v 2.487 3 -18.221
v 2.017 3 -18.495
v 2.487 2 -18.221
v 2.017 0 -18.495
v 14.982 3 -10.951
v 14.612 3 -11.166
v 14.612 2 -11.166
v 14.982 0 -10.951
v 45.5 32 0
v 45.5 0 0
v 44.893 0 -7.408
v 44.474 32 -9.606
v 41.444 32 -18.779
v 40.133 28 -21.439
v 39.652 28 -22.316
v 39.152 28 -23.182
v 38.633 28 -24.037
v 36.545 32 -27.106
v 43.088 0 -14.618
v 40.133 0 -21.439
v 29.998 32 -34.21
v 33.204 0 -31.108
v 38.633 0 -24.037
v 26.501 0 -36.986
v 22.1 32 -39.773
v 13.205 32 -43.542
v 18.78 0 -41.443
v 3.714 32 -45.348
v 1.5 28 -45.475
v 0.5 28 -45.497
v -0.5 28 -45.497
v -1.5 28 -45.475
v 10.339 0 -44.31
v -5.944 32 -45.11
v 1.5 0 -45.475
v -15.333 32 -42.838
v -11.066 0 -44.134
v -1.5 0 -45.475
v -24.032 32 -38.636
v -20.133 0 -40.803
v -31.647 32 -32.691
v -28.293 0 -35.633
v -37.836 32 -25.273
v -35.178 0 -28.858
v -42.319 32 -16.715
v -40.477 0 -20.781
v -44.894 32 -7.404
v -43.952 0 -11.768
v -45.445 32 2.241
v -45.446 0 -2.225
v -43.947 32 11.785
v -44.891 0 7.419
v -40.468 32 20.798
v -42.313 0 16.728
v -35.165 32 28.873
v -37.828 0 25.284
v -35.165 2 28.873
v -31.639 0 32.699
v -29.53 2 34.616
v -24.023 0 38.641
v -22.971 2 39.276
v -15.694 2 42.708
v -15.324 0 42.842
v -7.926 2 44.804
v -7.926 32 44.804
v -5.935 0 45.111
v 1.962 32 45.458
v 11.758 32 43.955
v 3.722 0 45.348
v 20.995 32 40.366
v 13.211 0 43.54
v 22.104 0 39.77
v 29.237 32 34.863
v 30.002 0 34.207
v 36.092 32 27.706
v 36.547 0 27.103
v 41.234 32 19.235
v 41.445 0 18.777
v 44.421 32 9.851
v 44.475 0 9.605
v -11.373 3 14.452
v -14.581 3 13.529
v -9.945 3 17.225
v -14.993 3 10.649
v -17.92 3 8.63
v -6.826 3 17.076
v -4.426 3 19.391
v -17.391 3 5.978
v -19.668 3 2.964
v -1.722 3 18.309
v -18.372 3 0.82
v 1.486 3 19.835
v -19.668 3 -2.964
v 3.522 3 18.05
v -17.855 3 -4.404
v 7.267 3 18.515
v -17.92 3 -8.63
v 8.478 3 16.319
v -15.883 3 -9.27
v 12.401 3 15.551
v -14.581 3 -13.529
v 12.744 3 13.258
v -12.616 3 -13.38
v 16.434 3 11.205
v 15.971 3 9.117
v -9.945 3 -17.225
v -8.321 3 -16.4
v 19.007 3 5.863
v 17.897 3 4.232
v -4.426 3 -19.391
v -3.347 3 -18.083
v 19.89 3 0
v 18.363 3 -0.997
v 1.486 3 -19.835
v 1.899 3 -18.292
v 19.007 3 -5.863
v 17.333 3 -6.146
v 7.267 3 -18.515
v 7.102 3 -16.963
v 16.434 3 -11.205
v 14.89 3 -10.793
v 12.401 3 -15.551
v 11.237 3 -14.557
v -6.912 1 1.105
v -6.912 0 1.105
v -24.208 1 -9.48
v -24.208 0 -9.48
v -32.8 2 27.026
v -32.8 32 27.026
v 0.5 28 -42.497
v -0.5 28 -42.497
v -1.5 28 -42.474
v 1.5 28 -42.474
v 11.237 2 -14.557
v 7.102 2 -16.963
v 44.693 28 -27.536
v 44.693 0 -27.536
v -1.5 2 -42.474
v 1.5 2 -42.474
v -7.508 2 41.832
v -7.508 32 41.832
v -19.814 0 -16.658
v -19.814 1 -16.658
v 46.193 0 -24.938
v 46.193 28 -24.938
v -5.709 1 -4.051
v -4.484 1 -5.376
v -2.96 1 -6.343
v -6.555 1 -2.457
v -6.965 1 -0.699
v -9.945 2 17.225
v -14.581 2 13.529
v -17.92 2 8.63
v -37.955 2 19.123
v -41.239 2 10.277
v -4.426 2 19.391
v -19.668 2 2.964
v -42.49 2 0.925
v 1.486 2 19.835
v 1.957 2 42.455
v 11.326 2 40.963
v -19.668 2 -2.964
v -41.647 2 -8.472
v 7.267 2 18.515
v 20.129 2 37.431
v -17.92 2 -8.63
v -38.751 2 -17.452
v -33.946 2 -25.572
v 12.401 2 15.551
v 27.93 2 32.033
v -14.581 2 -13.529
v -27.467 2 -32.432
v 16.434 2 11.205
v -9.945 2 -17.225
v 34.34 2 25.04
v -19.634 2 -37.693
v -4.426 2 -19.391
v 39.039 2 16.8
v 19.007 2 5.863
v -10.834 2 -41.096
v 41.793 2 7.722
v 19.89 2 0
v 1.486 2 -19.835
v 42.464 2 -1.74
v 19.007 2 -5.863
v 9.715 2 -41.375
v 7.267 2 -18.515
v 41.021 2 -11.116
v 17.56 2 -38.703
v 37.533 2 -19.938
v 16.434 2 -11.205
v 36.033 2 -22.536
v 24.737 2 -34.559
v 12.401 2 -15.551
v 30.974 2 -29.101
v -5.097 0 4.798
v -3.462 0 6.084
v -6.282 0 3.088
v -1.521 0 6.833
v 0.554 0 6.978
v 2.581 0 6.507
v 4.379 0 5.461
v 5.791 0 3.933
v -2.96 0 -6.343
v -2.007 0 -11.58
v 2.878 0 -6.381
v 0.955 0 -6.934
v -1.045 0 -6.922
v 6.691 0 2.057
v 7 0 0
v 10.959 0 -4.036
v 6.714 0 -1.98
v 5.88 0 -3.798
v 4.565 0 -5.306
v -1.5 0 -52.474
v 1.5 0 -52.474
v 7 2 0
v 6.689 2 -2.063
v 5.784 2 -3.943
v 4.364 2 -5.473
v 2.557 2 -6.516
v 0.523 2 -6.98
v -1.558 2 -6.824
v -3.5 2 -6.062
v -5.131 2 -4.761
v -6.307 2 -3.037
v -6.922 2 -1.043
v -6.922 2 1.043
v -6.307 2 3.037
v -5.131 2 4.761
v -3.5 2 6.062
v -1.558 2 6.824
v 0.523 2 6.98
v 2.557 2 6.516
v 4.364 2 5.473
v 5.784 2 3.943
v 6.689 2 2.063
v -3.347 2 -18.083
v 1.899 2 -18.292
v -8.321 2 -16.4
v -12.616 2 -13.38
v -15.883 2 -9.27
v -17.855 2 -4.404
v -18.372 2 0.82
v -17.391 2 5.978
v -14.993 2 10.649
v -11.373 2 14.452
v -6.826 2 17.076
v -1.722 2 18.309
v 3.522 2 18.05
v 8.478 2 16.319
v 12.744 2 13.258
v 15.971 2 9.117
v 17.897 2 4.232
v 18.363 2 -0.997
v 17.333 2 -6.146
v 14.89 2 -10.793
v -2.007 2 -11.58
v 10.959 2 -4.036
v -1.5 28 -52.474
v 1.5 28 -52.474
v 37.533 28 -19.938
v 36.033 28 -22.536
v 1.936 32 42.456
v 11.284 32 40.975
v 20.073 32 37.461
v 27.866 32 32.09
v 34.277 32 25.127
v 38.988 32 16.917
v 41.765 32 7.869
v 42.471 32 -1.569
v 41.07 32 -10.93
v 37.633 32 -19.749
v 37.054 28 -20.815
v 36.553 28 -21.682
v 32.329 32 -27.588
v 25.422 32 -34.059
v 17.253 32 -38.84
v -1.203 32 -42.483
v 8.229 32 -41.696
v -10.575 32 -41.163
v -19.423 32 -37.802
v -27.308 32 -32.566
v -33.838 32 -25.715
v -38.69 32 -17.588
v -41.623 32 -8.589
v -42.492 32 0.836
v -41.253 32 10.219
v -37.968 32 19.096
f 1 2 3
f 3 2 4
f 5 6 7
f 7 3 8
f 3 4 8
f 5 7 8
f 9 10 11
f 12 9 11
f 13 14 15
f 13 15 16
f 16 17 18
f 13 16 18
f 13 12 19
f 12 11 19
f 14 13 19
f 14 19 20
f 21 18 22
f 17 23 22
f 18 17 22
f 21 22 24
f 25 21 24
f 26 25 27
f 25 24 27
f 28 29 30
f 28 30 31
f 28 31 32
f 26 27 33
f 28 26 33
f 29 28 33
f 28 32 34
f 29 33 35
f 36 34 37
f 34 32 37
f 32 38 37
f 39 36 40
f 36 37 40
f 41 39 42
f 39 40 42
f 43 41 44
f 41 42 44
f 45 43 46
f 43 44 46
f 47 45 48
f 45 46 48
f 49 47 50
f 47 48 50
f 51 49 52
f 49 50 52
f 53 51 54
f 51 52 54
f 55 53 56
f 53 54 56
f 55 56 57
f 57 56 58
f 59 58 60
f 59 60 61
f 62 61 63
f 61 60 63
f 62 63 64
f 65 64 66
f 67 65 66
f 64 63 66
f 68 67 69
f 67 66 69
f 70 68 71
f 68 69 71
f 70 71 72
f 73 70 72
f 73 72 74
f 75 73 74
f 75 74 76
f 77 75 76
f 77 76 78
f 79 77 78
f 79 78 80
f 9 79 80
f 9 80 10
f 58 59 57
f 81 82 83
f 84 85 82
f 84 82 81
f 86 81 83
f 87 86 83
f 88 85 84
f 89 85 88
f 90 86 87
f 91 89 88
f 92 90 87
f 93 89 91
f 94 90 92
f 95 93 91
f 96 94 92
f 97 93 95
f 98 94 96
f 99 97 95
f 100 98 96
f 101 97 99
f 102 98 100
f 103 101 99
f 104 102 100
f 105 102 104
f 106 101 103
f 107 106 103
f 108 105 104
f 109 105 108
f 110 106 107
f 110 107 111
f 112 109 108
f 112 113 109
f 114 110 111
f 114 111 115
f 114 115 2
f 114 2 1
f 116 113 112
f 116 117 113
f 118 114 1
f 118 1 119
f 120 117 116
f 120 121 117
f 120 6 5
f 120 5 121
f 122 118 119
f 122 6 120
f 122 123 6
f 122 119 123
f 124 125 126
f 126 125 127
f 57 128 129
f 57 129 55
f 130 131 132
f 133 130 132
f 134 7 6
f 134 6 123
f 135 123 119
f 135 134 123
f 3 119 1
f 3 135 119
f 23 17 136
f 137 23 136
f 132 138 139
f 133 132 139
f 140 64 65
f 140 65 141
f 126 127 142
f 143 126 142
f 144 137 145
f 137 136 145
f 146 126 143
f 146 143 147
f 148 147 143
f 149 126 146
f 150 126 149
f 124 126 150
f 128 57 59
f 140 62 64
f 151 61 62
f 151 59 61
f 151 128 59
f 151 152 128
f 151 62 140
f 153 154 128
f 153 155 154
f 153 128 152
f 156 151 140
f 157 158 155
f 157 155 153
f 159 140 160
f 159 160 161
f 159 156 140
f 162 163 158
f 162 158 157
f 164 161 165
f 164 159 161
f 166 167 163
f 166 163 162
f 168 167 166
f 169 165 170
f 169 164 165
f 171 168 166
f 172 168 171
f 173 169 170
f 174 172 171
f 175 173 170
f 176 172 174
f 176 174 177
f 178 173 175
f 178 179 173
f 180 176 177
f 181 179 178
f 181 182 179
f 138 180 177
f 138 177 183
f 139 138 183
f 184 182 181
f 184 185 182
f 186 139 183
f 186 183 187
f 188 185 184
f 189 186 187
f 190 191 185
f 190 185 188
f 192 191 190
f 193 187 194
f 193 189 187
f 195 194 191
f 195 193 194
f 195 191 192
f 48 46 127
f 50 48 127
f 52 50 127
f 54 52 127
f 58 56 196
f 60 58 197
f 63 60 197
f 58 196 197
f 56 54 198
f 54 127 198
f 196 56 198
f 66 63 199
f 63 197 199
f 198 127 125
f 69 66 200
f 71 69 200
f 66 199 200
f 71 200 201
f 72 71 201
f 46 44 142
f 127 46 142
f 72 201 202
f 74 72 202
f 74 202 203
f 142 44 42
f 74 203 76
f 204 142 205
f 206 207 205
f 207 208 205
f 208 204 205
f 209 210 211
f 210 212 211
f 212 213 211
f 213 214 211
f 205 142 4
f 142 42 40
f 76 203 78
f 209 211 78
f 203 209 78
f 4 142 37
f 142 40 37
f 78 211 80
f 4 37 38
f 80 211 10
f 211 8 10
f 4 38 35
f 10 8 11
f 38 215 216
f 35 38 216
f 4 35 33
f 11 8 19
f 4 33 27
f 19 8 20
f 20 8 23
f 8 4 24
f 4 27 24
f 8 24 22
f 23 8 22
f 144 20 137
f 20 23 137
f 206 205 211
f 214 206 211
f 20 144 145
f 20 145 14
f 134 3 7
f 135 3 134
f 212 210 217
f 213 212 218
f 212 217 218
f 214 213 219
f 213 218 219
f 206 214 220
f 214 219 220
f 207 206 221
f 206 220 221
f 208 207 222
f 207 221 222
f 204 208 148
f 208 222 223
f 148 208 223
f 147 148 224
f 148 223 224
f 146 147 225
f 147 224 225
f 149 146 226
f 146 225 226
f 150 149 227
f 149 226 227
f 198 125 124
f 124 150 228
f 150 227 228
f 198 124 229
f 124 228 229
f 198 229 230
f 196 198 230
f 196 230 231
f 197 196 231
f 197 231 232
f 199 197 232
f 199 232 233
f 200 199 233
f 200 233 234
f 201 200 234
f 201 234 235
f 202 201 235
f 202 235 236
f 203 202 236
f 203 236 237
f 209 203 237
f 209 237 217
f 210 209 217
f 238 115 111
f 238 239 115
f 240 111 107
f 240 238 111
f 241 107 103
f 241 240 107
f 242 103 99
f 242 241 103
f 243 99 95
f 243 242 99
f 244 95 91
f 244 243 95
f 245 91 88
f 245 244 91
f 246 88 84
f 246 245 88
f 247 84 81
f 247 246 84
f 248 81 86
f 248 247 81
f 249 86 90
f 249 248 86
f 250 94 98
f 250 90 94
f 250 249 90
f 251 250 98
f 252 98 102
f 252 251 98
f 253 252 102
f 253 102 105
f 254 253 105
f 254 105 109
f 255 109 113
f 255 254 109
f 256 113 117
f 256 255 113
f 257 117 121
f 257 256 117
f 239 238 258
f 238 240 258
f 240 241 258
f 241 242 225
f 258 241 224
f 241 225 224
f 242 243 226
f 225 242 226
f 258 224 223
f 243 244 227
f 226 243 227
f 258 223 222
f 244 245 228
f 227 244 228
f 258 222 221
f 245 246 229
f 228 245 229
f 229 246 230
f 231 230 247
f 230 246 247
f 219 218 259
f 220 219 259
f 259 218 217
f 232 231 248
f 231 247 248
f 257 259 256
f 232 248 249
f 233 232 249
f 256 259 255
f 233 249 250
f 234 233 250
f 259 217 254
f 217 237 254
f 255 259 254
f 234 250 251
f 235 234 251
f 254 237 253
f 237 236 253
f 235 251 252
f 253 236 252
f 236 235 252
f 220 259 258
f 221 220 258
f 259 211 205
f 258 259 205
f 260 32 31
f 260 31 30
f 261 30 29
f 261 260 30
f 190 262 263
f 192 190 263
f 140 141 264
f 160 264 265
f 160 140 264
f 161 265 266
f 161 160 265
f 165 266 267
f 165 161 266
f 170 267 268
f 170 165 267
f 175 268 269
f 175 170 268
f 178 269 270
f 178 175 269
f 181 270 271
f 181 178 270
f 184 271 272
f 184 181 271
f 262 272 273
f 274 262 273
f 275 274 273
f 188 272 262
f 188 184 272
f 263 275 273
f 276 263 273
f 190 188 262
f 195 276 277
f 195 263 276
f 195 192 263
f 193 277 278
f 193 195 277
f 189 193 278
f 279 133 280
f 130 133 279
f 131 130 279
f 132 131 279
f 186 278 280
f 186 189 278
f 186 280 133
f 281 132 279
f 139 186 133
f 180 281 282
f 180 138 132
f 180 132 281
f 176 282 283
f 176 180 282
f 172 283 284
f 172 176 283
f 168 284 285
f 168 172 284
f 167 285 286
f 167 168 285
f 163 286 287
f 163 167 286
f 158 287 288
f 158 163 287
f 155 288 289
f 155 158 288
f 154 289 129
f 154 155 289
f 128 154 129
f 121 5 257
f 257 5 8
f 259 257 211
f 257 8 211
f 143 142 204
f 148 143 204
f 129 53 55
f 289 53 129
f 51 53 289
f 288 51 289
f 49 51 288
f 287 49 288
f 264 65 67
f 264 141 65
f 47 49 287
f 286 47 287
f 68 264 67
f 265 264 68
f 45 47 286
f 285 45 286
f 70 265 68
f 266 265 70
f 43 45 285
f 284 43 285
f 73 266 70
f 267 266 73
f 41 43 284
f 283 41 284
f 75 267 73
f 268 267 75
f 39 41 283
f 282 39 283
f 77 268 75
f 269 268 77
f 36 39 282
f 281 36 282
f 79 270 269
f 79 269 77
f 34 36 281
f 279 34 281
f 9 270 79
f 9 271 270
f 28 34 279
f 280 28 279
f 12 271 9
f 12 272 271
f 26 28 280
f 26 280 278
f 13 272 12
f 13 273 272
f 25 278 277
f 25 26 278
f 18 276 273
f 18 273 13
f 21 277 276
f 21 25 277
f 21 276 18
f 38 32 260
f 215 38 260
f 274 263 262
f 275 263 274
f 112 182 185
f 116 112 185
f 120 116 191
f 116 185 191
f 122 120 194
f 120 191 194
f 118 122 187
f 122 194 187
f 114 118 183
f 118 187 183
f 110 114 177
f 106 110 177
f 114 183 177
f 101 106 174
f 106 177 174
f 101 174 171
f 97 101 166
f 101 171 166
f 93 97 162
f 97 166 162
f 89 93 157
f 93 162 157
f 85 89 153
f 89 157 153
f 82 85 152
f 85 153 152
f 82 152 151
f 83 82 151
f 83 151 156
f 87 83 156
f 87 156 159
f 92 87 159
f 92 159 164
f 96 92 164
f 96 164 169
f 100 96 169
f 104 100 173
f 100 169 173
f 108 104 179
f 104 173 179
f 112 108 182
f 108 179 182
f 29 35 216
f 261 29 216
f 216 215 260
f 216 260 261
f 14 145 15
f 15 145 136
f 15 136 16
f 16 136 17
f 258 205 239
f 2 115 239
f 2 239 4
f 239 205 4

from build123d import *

# Parameters (mm, degrees)
SKETCH1_R                = 45.5
SKETCH1_R_2              = 42.5
BOSS_EXTRUDE1_DEPTH      = 32
SKETCH2_R                = 45.5
BOSS_EXTRUDE2_DEPTH      = 2
SKETCH3_R                = 7
CUT_EXTRUDE1_DEPTH       = 2
SKETCH7_W                = 3
SKETCH7_H                = 10
BOSS_EXTRUDE4_DEPTH      = 26
BOSS_EXTRUDE4_DEPTH_BACK = 2
SKETCH8_R                = 19.890165718
SKETCH8_R_2              = 18.390165718
BOSS_EXTRUDE5_DEPTH      = 1
CUT_EXTRUDE4_DEPTH       = 5.5
CUT_EXTRUDE5_DEPTH       = 58.5
CUT_EXTRUDE6_DEPTH       = 1


with BuildPart() as part:
    # Sketch1 → Boss-Extrude1 (new body)
    with BuildSketch(Plane(origin=(0, 0, 0), x_dir=(1, 0, 0), z_dir=(0, 1, 0))):
        Circle(SKETCH1_R)
        Circle(SKETCH1_R_2, mode=Mode.SUBTRACT)
    extrude(amount=BOSS_EXTRUDE1_DEPTH)

    # Sketch2 → Boss-Extrude2 (add)
    with BuildSketch(Plane.XZ):
        Circle(SKETCH2_R)
    extrude(amount=-BOSS_EXTRUDE2_DEPTH)

    # Sketch3 → Cut-Extrude1 (cut)
    with BuildSketch(Plane(origin=(0, 2, 0), x_dir=(1, 0, 0), z_dir=(0, 1, 0))):
        Circle(SKETCH3_R)
    extrude(amount=-CUT_EXTRUDE1_DEPTH, mode=Mode.SUBTRACT)

    # Sketch7 → Boss-Extrude4 (add, two sides)
    with BuildSketch(Plane(origin=(0, 2, 0), x_dir=(1, 0, 0), z_dir=(0, 1, 0))) as boss_extrude4_sk:
        with Locations((0, 47.473521163)):
            Rectangle(SKETCH7_W, SKETCH7_H)
        Polygon((46.193402353, 24.937722476), (37.533148315, 19.937722476), (36.033148315, 22.535798687), (44.693402353, 27.535798687), align=None)
    extrude(amount=BOSS_EXTRUDE4_DEPTH)
    extrude(boss_extrude4_sk.sketch, amount=-BOSS_EXTRUDE4_DEPTH_BACK)

    # Sketch8 → Boss-Extrude5 (add)
    with BuildSketch(Plane(origin=(0, 2, 0), x_dir=(1, 0, 0), z_dir=(0, 1, 0))):
        Circle(SKETCH8_R)
        Circle(SKETCH8_R_2, mode=Mode.SUBTRACT)
    extrude(amount=BOSS_EXTRUDE5_DEPTH)

    # Sketch10 → Cut-Extrude4 (cut)
    with BuildSketch(Plane.XZ):
        Polygon((2.016687189, -18.494703278), (14.981867268, -10.951222284), (10.958677405, -4.036459575), (-2.006502675, -11.579940569), align=None)
    extrude(amount=-CUT_EXTRUDE4_DEPTH, mode=Mode.SUBTRACT)

    # Sketch11 → Cut-Extrude5 (cut)
    with BuildSketch(Plane(origin=(0, 2, 0), x_dir=(1, 0, 0), z_dir=(0, 1, 0))):
        Polygon((-32.606600292, -26.874098434), (-35.165226496, -28.87311631), (-33.824988888, -37.754161376), (-11.7382848, -48.772412552), (-7.925983096, -44.804338986), (-7.495155029, -41.738838001), (-9.978475631, -35.419229659), (-25.965270809, -26.874098434), align=None)
    extrude(amount=CUT_EXTRUDE5_DEPTH, mode=Mode.SUBTRACT)

    # Sketch12 → Cut-Extrude6 (cut)
    with BuildSketch(Plane.XZ):
        Polygon((-6.912265346, 1.104802147), (-24.20763883, -9.480307189), (-19.814483018, -16.658435267), (-2.519109534, -6.073325931), align=None)
    extrude(amount=-CUT_EXTRUDE6_DEPTH, mode=Mode.SUBTRACT)


solid = part.part
